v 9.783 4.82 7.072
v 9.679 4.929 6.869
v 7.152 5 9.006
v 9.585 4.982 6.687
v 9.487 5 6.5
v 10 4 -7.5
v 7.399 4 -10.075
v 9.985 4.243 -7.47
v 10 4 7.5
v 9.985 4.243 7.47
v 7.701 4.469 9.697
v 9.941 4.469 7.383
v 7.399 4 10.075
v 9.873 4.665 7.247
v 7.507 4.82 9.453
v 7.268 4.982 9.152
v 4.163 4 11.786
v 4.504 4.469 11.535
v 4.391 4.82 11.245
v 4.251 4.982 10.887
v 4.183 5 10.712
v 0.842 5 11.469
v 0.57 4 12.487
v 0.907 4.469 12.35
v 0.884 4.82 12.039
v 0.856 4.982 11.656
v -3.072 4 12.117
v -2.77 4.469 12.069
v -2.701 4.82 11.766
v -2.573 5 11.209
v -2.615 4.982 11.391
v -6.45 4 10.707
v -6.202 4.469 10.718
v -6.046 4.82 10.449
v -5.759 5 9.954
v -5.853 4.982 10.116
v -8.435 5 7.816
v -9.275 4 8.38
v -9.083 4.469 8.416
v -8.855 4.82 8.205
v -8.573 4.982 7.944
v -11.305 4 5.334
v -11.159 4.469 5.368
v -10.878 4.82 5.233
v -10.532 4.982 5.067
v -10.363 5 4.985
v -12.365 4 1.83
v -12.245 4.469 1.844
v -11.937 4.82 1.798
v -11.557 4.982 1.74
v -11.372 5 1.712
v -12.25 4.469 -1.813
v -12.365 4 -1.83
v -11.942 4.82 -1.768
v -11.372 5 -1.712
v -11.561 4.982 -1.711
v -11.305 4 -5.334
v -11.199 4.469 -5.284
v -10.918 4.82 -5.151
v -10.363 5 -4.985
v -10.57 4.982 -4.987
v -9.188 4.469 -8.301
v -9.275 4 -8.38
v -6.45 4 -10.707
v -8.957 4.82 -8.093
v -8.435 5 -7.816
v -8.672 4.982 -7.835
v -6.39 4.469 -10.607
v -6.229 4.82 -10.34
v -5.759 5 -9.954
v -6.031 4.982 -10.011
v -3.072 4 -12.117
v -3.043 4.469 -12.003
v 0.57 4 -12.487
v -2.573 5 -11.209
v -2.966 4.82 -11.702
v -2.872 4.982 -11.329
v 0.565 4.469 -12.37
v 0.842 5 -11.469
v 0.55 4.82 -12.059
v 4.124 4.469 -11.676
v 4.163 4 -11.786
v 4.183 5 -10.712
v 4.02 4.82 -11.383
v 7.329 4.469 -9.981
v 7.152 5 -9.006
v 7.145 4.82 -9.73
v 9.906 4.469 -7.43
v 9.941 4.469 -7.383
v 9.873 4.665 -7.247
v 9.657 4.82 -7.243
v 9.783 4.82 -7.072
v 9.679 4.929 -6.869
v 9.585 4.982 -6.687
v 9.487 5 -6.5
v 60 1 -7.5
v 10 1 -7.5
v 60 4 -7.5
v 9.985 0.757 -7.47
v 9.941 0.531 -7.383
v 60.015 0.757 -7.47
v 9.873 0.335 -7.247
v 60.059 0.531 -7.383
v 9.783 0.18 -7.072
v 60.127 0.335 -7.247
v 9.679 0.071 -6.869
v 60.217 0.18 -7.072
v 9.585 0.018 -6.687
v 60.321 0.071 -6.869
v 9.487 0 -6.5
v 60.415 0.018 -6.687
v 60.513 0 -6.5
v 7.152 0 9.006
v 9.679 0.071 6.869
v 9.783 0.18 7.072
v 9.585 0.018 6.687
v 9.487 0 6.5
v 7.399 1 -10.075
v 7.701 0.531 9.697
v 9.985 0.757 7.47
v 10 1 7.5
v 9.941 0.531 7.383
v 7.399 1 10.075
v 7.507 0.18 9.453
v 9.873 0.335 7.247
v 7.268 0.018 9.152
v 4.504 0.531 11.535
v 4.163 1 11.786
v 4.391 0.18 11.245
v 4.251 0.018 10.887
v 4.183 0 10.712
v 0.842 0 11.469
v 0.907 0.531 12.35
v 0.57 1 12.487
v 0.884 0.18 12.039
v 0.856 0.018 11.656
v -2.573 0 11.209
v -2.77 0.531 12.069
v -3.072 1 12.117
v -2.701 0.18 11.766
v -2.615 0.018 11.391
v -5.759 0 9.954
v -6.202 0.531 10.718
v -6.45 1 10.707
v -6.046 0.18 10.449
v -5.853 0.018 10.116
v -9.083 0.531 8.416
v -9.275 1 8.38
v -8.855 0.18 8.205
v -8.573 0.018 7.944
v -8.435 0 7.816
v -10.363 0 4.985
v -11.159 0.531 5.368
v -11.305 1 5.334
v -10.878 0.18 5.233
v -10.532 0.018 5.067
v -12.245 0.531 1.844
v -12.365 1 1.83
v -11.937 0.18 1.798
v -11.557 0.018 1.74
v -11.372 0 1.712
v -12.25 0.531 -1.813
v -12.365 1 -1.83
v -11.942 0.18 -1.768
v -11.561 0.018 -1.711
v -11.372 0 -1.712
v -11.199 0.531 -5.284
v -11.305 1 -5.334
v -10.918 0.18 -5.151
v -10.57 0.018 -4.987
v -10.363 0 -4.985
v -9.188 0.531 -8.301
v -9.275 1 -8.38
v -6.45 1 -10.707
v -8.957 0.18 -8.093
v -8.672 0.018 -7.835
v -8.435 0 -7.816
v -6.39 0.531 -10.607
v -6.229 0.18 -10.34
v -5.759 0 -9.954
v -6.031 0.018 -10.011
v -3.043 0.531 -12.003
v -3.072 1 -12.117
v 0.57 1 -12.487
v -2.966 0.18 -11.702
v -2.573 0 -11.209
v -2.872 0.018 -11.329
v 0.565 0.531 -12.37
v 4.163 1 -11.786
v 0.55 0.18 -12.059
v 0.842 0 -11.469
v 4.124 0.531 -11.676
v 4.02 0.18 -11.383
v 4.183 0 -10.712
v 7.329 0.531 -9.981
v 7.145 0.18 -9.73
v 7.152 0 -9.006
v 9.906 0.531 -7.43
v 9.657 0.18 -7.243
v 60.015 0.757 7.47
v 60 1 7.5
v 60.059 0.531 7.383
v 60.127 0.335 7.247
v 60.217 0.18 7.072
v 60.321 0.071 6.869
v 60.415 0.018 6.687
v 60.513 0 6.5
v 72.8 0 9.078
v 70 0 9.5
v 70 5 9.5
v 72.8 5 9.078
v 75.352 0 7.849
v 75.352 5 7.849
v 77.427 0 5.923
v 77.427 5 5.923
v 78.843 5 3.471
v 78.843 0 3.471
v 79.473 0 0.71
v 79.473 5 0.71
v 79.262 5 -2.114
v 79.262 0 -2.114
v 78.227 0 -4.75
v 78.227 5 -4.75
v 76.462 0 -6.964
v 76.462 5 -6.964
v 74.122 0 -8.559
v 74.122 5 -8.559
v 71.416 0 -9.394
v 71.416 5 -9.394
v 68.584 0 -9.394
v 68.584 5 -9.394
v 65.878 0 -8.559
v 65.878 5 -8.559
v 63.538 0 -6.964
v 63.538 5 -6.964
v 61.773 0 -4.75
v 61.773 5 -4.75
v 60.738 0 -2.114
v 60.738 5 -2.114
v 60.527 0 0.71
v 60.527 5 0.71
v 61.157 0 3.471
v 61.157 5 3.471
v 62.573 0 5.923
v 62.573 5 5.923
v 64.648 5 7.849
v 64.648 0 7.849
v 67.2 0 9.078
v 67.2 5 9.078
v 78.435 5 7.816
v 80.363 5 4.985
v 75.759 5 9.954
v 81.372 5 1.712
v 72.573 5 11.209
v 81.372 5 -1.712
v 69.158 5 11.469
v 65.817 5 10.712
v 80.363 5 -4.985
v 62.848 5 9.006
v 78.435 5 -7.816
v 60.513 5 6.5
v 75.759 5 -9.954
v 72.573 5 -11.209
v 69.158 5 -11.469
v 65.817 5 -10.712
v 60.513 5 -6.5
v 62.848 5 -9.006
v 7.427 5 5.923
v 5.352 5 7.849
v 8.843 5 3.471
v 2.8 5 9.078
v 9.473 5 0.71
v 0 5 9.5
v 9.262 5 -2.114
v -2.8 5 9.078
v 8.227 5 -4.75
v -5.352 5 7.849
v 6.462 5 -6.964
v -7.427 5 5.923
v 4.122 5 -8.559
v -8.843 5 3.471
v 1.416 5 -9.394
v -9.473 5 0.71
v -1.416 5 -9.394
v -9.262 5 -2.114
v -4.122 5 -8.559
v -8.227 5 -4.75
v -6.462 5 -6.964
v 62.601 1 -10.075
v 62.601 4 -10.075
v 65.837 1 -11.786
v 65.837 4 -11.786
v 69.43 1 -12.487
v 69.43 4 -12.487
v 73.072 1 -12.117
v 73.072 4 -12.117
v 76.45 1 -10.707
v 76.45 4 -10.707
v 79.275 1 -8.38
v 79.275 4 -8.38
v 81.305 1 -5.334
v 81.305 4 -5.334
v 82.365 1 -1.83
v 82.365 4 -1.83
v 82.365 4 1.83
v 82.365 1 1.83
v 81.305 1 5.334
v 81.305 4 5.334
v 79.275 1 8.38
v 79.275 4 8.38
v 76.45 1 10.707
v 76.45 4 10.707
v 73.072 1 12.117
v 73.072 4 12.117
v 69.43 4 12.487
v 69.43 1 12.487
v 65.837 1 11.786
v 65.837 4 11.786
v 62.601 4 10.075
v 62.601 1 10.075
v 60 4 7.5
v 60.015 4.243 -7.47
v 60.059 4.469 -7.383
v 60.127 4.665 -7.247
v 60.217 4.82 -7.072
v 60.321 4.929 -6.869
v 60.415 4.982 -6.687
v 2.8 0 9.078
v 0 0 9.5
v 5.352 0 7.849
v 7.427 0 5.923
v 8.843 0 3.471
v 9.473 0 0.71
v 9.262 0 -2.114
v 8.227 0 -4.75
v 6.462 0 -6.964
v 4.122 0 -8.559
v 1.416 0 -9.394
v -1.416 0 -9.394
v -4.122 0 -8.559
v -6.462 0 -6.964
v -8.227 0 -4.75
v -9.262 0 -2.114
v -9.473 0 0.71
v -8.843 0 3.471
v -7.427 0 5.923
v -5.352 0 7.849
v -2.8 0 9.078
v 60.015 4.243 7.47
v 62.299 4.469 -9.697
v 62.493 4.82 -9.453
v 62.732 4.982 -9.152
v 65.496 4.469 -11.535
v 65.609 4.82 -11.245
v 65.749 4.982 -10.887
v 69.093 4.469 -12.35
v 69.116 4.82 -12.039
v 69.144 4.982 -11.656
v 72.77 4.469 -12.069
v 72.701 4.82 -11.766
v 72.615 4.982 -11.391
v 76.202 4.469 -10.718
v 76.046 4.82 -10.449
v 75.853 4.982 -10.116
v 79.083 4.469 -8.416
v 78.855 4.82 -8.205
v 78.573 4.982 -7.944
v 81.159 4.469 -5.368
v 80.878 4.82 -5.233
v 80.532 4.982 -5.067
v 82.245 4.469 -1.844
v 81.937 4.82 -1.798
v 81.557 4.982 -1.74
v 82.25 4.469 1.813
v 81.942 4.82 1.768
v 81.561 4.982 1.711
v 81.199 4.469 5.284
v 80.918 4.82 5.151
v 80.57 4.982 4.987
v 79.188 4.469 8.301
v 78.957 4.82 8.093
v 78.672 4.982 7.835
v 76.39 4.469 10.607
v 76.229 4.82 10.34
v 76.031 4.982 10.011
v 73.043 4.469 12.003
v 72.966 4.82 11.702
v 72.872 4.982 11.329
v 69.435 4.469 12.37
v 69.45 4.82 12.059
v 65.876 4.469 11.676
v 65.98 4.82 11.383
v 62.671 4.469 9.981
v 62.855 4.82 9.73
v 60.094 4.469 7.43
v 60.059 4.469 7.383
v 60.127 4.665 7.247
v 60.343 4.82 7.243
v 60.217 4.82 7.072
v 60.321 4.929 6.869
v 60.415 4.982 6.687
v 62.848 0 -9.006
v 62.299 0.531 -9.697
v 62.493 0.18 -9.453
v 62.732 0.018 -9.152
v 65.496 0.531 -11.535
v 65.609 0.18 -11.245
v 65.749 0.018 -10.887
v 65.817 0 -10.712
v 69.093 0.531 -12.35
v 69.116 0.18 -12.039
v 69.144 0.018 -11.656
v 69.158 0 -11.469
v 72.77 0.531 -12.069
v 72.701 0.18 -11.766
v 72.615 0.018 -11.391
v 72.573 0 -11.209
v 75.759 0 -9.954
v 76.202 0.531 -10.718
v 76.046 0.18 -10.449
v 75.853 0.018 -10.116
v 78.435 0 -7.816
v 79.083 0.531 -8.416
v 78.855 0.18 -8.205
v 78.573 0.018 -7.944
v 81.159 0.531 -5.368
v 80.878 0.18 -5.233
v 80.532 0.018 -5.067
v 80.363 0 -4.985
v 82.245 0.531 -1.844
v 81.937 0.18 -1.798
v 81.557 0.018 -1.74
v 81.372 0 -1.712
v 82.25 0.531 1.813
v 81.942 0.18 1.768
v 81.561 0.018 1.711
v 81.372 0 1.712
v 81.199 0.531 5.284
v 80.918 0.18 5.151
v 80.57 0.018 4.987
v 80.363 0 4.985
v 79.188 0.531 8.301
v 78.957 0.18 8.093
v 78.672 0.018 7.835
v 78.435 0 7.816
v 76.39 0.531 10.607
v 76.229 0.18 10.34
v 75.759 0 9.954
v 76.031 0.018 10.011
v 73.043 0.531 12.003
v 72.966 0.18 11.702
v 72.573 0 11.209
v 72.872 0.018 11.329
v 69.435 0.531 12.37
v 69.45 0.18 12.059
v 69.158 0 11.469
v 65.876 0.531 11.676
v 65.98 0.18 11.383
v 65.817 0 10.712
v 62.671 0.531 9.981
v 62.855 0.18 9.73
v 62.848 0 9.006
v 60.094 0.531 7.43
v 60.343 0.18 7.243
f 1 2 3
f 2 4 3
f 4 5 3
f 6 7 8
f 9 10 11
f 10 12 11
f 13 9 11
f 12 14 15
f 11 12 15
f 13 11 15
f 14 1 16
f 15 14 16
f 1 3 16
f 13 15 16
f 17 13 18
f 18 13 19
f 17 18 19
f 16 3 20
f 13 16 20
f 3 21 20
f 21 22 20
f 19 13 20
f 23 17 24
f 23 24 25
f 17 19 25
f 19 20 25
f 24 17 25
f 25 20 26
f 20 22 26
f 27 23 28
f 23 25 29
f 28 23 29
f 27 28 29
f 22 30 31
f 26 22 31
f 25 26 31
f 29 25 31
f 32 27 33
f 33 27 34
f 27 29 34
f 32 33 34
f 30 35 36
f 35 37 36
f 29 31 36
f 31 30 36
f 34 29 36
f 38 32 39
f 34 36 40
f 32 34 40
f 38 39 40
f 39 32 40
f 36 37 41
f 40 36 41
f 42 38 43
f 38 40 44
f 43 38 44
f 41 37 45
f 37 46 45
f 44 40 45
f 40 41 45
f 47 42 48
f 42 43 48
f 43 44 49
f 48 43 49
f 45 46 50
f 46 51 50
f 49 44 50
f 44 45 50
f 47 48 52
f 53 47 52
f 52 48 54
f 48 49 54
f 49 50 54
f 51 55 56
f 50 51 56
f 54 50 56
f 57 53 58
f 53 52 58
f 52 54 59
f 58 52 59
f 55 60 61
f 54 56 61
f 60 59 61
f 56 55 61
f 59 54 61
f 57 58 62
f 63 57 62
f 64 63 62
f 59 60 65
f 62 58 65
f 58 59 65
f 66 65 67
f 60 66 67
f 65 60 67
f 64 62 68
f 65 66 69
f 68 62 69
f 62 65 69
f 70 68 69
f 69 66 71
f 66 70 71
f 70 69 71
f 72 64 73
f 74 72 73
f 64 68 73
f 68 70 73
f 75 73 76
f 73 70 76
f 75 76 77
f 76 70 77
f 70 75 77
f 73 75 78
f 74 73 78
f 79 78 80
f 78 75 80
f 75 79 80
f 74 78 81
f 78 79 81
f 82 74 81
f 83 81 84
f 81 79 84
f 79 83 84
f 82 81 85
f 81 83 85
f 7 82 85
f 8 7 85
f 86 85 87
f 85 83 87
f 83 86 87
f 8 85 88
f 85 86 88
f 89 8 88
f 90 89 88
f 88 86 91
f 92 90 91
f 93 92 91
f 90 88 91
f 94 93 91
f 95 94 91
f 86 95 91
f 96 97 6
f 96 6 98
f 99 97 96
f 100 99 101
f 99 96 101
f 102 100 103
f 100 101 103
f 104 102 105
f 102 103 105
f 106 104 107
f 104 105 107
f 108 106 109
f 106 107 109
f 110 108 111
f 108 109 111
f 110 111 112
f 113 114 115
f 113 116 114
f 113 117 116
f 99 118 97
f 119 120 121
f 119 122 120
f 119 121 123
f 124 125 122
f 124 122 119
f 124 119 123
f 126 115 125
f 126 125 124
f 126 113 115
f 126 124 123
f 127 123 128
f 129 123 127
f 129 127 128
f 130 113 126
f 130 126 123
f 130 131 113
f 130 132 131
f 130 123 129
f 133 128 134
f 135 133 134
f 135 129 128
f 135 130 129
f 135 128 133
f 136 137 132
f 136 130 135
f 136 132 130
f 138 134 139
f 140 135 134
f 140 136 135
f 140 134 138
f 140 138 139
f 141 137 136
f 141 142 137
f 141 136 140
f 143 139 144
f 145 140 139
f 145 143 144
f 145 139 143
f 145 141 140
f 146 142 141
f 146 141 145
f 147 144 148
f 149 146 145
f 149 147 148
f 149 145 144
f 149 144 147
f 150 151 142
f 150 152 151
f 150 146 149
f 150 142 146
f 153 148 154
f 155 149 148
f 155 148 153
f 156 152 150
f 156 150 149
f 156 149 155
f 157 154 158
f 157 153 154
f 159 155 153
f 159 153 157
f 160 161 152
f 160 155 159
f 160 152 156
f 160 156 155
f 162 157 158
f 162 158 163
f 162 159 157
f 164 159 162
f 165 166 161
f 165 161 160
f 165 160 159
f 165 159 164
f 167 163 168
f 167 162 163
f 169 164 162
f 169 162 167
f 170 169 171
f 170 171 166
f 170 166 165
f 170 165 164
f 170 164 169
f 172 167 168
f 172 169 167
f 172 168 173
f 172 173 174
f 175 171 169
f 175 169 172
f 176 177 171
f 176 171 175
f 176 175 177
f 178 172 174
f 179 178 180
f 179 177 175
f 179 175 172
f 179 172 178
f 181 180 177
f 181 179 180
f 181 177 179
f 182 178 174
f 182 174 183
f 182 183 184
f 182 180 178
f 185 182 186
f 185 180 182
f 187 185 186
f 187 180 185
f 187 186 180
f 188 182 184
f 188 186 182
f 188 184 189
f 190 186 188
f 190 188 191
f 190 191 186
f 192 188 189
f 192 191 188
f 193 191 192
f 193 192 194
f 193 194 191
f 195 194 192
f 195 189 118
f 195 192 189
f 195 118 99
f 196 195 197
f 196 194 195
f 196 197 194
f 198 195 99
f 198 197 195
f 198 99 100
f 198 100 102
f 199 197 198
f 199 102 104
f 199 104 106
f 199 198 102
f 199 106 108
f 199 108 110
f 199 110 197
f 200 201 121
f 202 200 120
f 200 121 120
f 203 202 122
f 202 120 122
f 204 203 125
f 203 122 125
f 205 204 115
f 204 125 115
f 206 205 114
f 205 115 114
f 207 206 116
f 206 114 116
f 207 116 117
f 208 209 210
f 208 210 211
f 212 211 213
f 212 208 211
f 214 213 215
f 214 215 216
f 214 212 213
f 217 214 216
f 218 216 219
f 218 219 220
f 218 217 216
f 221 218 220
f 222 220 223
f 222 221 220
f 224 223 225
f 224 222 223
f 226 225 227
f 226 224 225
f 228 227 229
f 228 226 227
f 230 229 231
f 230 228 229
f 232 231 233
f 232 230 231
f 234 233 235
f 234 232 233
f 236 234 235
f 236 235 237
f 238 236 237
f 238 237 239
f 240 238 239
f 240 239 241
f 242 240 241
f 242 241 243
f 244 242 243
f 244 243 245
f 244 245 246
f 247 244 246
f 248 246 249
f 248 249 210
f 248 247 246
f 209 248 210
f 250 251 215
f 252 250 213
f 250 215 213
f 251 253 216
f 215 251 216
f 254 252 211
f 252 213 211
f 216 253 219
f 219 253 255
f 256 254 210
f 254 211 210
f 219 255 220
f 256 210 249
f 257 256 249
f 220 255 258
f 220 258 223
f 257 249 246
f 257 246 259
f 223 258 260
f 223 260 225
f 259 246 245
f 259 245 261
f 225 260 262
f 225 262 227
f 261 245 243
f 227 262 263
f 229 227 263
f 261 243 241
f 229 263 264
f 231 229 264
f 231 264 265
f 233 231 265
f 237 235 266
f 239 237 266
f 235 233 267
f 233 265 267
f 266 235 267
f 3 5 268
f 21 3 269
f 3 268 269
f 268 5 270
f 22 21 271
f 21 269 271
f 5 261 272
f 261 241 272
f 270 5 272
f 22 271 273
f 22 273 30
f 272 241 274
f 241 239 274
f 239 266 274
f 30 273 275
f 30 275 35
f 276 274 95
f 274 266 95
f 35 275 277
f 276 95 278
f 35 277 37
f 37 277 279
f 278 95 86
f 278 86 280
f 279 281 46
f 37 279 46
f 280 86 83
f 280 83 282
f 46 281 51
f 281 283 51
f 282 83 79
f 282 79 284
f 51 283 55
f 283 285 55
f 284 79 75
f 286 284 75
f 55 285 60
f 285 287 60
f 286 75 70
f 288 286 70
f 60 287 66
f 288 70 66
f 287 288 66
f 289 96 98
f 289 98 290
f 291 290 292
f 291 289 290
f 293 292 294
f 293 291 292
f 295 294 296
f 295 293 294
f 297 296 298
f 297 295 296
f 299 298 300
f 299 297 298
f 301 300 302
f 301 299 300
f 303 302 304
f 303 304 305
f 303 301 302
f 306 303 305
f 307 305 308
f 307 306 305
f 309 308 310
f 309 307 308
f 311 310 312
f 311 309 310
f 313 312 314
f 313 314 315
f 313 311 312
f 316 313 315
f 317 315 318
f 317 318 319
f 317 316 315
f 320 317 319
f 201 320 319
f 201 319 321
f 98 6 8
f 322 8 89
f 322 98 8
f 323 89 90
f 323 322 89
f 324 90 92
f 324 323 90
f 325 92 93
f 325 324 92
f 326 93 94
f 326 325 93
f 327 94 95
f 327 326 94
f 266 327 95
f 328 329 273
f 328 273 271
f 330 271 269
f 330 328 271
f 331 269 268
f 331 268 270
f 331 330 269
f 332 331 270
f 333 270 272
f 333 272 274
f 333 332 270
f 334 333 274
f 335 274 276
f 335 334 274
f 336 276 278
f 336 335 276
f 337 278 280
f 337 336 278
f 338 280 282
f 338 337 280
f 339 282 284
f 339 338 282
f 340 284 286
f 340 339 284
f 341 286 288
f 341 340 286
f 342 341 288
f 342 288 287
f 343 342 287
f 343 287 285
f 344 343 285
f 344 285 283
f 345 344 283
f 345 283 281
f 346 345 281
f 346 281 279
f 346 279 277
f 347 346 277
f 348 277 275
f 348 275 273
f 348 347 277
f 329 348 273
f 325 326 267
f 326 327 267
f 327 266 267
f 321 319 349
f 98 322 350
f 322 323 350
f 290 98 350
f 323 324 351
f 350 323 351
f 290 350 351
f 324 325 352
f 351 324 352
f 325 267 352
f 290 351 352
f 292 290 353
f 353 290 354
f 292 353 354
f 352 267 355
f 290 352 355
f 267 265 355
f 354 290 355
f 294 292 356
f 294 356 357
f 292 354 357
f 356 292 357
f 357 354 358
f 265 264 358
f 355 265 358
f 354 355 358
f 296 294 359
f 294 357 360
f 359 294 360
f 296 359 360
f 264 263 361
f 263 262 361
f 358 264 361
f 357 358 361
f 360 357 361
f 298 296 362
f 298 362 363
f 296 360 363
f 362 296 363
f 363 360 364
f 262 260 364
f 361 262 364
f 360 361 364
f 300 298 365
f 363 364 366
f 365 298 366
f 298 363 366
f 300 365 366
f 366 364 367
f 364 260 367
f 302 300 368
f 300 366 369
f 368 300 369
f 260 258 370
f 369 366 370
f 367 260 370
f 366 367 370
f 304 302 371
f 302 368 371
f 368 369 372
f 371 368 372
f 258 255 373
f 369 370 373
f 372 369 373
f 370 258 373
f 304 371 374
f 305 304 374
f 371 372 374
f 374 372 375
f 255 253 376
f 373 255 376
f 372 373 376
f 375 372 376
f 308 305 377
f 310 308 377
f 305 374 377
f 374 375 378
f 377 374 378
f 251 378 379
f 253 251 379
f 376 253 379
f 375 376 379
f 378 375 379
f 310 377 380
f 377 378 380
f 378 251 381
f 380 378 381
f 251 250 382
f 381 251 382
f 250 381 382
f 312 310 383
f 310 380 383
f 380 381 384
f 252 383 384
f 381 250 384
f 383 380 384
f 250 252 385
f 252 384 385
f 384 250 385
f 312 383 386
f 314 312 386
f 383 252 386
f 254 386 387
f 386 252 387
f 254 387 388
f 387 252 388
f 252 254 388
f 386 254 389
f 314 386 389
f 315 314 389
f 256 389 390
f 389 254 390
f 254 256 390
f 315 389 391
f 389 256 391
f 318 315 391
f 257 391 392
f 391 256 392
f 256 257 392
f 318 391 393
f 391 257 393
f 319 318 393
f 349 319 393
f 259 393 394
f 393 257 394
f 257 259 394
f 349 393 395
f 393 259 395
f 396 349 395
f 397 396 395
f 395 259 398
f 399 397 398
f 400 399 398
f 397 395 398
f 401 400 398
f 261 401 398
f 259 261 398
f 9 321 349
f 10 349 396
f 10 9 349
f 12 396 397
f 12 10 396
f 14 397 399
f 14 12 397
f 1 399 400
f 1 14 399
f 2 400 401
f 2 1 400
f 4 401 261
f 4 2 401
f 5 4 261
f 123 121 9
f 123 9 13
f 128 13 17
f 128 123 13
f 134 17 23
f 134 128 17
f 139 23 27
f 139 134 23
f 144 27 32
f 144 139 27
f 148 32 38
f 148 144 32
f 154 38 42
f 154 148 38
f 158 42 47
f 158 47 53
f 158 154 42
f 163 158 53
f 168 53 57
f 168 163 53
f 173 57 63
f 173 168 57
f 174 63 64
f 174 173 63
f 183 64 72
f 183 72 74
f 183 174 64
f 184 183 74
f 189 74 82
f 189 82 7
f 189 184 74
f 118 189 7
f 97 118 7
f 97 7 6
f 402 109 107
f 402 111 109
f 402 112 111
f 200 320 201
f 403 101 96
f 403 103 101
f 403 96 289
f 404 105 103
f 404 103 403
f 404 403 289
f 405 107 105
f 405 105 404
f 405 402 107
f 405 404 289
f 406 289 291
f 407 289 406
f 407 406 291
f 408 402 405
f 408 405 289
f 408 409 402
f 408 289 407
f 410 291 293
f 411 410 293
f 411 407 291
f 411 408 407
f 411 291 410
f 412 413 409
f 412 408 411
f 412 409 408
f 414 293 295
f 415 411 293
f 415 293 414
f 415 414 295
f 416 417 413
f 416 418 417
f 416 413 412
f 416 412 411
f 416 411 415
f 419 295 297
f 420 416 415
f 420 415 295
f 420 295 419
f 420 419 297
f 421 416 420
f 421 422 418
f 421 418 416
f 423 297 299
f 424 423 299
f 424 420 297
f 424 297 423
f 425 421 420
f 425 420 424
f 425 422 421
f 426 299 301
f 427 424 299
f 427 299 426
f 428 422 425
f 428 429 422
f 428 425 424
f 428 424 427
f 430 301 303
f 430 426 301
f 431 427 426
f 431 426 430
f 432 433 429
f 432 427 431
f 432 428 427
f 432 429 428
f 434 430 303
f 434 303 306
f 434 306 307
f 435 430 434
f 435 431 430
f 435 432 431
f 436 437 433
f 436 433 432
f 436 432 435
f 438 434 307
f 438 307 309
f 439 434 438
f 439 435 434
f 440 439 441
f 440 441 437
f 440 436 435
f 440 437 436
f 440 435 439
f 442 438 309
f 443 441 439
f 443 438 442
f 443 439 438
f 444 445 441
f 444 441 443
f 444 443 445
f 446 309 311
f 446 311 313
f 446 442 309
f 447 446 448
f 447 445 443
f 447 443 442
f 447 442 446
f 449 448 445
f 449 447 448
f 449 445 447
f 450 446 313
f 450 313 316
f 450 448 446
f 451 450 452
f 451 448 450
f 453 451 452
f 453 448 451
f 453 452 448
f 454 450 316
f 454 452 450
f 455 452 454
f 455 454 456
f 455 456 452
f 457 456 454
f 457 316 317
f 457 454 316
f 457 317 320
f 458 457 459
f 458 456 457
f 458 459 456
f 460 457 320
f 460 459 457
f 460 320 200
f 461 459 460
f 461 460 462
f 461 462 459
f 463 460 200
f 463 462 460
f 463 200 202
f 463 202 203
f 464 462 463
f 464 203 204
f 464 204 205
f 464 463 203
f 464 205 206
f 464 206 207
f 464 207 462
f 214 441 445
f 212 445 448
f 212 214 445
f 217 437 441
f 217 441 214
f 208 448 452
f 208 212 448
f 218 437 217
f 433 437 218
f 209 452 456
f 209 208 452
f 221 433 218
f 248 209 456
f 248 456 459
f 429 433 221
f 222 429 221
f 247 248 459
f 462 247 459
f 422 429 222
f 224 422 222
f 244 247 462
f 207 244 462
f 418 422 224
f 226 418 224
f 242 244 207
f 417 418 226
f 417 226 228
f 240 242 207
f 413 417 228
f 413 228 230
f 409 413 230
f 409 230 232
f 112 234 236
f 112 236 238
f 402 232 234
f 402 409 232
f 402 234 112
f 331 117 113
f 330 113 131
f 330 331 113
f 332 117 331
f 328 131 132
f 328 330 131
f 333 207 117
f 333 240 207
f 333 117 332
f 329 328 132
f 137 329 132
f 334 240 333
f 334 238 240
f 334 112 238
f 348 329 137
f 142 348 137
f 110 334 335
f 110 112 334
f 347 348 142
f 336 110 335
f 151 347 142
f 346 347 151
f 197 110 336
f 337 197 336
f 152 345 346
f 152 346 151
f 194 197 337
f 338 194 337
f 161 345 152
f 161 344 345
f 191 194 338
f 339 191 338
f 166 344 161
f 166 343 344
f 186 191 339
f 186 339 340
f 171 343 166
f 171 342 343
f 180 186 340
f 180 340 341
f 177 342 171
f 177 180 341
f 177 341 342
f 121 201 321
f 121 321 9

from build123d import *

# Parameters (mm, degrees)
SKETCH1_R           = 9.5
BOSS_EXTRUDE1_DEPTH = 5
FILLET1_R           = 1


with BuildPart() as part:
    # Sketch1 → Boss-Extrude1 (new body)
    with BuildSketch(Plane(origin=(0, 0, 0), x_dir=(1, 0, 0), z_dir=(0, 1, 0))):
        with BuildLine():
            Line((10, 7.5), (60, 7.5))
            ThreePointArc((60, 7.5), (82.5, 0), (60, -7.5))
            Line((60, -7.5), (10, -7.5))
            ThreePointArc((10, -7.5), (-12.5, 0), (10, 7.5))
        make_face()
        with Locations(Location((0, 0, 0), (0, 0, 270))):
            Circle(SKETCH1_R, mode=Mode.SUBTRACT)
        with Locations(Location((70, 0, 0), (0, 0, 270))):
            Circle(SKETCH1_R, mode=Mode.SUBTRACT)
    extrude(amount=BOSS_EXTRUDE1_DEPTH)

    # Fillet1
    fillet1_edges = [part.edges().sort_by_distance(p)[0] for p in [
        (82.5, 5, 0),
        (35, 5, -7.5),
        (-12.5, 5, 0),
        (35, 0, -7.5),
        (82.5, 0, 0),
        (35, 0, 7.5),
        (-12.5, 0, 0),
        (35, 5, 7.5),
    ]]
    fillet(fillet1_edges, radius=FILLET1_R)


solid = part.part
